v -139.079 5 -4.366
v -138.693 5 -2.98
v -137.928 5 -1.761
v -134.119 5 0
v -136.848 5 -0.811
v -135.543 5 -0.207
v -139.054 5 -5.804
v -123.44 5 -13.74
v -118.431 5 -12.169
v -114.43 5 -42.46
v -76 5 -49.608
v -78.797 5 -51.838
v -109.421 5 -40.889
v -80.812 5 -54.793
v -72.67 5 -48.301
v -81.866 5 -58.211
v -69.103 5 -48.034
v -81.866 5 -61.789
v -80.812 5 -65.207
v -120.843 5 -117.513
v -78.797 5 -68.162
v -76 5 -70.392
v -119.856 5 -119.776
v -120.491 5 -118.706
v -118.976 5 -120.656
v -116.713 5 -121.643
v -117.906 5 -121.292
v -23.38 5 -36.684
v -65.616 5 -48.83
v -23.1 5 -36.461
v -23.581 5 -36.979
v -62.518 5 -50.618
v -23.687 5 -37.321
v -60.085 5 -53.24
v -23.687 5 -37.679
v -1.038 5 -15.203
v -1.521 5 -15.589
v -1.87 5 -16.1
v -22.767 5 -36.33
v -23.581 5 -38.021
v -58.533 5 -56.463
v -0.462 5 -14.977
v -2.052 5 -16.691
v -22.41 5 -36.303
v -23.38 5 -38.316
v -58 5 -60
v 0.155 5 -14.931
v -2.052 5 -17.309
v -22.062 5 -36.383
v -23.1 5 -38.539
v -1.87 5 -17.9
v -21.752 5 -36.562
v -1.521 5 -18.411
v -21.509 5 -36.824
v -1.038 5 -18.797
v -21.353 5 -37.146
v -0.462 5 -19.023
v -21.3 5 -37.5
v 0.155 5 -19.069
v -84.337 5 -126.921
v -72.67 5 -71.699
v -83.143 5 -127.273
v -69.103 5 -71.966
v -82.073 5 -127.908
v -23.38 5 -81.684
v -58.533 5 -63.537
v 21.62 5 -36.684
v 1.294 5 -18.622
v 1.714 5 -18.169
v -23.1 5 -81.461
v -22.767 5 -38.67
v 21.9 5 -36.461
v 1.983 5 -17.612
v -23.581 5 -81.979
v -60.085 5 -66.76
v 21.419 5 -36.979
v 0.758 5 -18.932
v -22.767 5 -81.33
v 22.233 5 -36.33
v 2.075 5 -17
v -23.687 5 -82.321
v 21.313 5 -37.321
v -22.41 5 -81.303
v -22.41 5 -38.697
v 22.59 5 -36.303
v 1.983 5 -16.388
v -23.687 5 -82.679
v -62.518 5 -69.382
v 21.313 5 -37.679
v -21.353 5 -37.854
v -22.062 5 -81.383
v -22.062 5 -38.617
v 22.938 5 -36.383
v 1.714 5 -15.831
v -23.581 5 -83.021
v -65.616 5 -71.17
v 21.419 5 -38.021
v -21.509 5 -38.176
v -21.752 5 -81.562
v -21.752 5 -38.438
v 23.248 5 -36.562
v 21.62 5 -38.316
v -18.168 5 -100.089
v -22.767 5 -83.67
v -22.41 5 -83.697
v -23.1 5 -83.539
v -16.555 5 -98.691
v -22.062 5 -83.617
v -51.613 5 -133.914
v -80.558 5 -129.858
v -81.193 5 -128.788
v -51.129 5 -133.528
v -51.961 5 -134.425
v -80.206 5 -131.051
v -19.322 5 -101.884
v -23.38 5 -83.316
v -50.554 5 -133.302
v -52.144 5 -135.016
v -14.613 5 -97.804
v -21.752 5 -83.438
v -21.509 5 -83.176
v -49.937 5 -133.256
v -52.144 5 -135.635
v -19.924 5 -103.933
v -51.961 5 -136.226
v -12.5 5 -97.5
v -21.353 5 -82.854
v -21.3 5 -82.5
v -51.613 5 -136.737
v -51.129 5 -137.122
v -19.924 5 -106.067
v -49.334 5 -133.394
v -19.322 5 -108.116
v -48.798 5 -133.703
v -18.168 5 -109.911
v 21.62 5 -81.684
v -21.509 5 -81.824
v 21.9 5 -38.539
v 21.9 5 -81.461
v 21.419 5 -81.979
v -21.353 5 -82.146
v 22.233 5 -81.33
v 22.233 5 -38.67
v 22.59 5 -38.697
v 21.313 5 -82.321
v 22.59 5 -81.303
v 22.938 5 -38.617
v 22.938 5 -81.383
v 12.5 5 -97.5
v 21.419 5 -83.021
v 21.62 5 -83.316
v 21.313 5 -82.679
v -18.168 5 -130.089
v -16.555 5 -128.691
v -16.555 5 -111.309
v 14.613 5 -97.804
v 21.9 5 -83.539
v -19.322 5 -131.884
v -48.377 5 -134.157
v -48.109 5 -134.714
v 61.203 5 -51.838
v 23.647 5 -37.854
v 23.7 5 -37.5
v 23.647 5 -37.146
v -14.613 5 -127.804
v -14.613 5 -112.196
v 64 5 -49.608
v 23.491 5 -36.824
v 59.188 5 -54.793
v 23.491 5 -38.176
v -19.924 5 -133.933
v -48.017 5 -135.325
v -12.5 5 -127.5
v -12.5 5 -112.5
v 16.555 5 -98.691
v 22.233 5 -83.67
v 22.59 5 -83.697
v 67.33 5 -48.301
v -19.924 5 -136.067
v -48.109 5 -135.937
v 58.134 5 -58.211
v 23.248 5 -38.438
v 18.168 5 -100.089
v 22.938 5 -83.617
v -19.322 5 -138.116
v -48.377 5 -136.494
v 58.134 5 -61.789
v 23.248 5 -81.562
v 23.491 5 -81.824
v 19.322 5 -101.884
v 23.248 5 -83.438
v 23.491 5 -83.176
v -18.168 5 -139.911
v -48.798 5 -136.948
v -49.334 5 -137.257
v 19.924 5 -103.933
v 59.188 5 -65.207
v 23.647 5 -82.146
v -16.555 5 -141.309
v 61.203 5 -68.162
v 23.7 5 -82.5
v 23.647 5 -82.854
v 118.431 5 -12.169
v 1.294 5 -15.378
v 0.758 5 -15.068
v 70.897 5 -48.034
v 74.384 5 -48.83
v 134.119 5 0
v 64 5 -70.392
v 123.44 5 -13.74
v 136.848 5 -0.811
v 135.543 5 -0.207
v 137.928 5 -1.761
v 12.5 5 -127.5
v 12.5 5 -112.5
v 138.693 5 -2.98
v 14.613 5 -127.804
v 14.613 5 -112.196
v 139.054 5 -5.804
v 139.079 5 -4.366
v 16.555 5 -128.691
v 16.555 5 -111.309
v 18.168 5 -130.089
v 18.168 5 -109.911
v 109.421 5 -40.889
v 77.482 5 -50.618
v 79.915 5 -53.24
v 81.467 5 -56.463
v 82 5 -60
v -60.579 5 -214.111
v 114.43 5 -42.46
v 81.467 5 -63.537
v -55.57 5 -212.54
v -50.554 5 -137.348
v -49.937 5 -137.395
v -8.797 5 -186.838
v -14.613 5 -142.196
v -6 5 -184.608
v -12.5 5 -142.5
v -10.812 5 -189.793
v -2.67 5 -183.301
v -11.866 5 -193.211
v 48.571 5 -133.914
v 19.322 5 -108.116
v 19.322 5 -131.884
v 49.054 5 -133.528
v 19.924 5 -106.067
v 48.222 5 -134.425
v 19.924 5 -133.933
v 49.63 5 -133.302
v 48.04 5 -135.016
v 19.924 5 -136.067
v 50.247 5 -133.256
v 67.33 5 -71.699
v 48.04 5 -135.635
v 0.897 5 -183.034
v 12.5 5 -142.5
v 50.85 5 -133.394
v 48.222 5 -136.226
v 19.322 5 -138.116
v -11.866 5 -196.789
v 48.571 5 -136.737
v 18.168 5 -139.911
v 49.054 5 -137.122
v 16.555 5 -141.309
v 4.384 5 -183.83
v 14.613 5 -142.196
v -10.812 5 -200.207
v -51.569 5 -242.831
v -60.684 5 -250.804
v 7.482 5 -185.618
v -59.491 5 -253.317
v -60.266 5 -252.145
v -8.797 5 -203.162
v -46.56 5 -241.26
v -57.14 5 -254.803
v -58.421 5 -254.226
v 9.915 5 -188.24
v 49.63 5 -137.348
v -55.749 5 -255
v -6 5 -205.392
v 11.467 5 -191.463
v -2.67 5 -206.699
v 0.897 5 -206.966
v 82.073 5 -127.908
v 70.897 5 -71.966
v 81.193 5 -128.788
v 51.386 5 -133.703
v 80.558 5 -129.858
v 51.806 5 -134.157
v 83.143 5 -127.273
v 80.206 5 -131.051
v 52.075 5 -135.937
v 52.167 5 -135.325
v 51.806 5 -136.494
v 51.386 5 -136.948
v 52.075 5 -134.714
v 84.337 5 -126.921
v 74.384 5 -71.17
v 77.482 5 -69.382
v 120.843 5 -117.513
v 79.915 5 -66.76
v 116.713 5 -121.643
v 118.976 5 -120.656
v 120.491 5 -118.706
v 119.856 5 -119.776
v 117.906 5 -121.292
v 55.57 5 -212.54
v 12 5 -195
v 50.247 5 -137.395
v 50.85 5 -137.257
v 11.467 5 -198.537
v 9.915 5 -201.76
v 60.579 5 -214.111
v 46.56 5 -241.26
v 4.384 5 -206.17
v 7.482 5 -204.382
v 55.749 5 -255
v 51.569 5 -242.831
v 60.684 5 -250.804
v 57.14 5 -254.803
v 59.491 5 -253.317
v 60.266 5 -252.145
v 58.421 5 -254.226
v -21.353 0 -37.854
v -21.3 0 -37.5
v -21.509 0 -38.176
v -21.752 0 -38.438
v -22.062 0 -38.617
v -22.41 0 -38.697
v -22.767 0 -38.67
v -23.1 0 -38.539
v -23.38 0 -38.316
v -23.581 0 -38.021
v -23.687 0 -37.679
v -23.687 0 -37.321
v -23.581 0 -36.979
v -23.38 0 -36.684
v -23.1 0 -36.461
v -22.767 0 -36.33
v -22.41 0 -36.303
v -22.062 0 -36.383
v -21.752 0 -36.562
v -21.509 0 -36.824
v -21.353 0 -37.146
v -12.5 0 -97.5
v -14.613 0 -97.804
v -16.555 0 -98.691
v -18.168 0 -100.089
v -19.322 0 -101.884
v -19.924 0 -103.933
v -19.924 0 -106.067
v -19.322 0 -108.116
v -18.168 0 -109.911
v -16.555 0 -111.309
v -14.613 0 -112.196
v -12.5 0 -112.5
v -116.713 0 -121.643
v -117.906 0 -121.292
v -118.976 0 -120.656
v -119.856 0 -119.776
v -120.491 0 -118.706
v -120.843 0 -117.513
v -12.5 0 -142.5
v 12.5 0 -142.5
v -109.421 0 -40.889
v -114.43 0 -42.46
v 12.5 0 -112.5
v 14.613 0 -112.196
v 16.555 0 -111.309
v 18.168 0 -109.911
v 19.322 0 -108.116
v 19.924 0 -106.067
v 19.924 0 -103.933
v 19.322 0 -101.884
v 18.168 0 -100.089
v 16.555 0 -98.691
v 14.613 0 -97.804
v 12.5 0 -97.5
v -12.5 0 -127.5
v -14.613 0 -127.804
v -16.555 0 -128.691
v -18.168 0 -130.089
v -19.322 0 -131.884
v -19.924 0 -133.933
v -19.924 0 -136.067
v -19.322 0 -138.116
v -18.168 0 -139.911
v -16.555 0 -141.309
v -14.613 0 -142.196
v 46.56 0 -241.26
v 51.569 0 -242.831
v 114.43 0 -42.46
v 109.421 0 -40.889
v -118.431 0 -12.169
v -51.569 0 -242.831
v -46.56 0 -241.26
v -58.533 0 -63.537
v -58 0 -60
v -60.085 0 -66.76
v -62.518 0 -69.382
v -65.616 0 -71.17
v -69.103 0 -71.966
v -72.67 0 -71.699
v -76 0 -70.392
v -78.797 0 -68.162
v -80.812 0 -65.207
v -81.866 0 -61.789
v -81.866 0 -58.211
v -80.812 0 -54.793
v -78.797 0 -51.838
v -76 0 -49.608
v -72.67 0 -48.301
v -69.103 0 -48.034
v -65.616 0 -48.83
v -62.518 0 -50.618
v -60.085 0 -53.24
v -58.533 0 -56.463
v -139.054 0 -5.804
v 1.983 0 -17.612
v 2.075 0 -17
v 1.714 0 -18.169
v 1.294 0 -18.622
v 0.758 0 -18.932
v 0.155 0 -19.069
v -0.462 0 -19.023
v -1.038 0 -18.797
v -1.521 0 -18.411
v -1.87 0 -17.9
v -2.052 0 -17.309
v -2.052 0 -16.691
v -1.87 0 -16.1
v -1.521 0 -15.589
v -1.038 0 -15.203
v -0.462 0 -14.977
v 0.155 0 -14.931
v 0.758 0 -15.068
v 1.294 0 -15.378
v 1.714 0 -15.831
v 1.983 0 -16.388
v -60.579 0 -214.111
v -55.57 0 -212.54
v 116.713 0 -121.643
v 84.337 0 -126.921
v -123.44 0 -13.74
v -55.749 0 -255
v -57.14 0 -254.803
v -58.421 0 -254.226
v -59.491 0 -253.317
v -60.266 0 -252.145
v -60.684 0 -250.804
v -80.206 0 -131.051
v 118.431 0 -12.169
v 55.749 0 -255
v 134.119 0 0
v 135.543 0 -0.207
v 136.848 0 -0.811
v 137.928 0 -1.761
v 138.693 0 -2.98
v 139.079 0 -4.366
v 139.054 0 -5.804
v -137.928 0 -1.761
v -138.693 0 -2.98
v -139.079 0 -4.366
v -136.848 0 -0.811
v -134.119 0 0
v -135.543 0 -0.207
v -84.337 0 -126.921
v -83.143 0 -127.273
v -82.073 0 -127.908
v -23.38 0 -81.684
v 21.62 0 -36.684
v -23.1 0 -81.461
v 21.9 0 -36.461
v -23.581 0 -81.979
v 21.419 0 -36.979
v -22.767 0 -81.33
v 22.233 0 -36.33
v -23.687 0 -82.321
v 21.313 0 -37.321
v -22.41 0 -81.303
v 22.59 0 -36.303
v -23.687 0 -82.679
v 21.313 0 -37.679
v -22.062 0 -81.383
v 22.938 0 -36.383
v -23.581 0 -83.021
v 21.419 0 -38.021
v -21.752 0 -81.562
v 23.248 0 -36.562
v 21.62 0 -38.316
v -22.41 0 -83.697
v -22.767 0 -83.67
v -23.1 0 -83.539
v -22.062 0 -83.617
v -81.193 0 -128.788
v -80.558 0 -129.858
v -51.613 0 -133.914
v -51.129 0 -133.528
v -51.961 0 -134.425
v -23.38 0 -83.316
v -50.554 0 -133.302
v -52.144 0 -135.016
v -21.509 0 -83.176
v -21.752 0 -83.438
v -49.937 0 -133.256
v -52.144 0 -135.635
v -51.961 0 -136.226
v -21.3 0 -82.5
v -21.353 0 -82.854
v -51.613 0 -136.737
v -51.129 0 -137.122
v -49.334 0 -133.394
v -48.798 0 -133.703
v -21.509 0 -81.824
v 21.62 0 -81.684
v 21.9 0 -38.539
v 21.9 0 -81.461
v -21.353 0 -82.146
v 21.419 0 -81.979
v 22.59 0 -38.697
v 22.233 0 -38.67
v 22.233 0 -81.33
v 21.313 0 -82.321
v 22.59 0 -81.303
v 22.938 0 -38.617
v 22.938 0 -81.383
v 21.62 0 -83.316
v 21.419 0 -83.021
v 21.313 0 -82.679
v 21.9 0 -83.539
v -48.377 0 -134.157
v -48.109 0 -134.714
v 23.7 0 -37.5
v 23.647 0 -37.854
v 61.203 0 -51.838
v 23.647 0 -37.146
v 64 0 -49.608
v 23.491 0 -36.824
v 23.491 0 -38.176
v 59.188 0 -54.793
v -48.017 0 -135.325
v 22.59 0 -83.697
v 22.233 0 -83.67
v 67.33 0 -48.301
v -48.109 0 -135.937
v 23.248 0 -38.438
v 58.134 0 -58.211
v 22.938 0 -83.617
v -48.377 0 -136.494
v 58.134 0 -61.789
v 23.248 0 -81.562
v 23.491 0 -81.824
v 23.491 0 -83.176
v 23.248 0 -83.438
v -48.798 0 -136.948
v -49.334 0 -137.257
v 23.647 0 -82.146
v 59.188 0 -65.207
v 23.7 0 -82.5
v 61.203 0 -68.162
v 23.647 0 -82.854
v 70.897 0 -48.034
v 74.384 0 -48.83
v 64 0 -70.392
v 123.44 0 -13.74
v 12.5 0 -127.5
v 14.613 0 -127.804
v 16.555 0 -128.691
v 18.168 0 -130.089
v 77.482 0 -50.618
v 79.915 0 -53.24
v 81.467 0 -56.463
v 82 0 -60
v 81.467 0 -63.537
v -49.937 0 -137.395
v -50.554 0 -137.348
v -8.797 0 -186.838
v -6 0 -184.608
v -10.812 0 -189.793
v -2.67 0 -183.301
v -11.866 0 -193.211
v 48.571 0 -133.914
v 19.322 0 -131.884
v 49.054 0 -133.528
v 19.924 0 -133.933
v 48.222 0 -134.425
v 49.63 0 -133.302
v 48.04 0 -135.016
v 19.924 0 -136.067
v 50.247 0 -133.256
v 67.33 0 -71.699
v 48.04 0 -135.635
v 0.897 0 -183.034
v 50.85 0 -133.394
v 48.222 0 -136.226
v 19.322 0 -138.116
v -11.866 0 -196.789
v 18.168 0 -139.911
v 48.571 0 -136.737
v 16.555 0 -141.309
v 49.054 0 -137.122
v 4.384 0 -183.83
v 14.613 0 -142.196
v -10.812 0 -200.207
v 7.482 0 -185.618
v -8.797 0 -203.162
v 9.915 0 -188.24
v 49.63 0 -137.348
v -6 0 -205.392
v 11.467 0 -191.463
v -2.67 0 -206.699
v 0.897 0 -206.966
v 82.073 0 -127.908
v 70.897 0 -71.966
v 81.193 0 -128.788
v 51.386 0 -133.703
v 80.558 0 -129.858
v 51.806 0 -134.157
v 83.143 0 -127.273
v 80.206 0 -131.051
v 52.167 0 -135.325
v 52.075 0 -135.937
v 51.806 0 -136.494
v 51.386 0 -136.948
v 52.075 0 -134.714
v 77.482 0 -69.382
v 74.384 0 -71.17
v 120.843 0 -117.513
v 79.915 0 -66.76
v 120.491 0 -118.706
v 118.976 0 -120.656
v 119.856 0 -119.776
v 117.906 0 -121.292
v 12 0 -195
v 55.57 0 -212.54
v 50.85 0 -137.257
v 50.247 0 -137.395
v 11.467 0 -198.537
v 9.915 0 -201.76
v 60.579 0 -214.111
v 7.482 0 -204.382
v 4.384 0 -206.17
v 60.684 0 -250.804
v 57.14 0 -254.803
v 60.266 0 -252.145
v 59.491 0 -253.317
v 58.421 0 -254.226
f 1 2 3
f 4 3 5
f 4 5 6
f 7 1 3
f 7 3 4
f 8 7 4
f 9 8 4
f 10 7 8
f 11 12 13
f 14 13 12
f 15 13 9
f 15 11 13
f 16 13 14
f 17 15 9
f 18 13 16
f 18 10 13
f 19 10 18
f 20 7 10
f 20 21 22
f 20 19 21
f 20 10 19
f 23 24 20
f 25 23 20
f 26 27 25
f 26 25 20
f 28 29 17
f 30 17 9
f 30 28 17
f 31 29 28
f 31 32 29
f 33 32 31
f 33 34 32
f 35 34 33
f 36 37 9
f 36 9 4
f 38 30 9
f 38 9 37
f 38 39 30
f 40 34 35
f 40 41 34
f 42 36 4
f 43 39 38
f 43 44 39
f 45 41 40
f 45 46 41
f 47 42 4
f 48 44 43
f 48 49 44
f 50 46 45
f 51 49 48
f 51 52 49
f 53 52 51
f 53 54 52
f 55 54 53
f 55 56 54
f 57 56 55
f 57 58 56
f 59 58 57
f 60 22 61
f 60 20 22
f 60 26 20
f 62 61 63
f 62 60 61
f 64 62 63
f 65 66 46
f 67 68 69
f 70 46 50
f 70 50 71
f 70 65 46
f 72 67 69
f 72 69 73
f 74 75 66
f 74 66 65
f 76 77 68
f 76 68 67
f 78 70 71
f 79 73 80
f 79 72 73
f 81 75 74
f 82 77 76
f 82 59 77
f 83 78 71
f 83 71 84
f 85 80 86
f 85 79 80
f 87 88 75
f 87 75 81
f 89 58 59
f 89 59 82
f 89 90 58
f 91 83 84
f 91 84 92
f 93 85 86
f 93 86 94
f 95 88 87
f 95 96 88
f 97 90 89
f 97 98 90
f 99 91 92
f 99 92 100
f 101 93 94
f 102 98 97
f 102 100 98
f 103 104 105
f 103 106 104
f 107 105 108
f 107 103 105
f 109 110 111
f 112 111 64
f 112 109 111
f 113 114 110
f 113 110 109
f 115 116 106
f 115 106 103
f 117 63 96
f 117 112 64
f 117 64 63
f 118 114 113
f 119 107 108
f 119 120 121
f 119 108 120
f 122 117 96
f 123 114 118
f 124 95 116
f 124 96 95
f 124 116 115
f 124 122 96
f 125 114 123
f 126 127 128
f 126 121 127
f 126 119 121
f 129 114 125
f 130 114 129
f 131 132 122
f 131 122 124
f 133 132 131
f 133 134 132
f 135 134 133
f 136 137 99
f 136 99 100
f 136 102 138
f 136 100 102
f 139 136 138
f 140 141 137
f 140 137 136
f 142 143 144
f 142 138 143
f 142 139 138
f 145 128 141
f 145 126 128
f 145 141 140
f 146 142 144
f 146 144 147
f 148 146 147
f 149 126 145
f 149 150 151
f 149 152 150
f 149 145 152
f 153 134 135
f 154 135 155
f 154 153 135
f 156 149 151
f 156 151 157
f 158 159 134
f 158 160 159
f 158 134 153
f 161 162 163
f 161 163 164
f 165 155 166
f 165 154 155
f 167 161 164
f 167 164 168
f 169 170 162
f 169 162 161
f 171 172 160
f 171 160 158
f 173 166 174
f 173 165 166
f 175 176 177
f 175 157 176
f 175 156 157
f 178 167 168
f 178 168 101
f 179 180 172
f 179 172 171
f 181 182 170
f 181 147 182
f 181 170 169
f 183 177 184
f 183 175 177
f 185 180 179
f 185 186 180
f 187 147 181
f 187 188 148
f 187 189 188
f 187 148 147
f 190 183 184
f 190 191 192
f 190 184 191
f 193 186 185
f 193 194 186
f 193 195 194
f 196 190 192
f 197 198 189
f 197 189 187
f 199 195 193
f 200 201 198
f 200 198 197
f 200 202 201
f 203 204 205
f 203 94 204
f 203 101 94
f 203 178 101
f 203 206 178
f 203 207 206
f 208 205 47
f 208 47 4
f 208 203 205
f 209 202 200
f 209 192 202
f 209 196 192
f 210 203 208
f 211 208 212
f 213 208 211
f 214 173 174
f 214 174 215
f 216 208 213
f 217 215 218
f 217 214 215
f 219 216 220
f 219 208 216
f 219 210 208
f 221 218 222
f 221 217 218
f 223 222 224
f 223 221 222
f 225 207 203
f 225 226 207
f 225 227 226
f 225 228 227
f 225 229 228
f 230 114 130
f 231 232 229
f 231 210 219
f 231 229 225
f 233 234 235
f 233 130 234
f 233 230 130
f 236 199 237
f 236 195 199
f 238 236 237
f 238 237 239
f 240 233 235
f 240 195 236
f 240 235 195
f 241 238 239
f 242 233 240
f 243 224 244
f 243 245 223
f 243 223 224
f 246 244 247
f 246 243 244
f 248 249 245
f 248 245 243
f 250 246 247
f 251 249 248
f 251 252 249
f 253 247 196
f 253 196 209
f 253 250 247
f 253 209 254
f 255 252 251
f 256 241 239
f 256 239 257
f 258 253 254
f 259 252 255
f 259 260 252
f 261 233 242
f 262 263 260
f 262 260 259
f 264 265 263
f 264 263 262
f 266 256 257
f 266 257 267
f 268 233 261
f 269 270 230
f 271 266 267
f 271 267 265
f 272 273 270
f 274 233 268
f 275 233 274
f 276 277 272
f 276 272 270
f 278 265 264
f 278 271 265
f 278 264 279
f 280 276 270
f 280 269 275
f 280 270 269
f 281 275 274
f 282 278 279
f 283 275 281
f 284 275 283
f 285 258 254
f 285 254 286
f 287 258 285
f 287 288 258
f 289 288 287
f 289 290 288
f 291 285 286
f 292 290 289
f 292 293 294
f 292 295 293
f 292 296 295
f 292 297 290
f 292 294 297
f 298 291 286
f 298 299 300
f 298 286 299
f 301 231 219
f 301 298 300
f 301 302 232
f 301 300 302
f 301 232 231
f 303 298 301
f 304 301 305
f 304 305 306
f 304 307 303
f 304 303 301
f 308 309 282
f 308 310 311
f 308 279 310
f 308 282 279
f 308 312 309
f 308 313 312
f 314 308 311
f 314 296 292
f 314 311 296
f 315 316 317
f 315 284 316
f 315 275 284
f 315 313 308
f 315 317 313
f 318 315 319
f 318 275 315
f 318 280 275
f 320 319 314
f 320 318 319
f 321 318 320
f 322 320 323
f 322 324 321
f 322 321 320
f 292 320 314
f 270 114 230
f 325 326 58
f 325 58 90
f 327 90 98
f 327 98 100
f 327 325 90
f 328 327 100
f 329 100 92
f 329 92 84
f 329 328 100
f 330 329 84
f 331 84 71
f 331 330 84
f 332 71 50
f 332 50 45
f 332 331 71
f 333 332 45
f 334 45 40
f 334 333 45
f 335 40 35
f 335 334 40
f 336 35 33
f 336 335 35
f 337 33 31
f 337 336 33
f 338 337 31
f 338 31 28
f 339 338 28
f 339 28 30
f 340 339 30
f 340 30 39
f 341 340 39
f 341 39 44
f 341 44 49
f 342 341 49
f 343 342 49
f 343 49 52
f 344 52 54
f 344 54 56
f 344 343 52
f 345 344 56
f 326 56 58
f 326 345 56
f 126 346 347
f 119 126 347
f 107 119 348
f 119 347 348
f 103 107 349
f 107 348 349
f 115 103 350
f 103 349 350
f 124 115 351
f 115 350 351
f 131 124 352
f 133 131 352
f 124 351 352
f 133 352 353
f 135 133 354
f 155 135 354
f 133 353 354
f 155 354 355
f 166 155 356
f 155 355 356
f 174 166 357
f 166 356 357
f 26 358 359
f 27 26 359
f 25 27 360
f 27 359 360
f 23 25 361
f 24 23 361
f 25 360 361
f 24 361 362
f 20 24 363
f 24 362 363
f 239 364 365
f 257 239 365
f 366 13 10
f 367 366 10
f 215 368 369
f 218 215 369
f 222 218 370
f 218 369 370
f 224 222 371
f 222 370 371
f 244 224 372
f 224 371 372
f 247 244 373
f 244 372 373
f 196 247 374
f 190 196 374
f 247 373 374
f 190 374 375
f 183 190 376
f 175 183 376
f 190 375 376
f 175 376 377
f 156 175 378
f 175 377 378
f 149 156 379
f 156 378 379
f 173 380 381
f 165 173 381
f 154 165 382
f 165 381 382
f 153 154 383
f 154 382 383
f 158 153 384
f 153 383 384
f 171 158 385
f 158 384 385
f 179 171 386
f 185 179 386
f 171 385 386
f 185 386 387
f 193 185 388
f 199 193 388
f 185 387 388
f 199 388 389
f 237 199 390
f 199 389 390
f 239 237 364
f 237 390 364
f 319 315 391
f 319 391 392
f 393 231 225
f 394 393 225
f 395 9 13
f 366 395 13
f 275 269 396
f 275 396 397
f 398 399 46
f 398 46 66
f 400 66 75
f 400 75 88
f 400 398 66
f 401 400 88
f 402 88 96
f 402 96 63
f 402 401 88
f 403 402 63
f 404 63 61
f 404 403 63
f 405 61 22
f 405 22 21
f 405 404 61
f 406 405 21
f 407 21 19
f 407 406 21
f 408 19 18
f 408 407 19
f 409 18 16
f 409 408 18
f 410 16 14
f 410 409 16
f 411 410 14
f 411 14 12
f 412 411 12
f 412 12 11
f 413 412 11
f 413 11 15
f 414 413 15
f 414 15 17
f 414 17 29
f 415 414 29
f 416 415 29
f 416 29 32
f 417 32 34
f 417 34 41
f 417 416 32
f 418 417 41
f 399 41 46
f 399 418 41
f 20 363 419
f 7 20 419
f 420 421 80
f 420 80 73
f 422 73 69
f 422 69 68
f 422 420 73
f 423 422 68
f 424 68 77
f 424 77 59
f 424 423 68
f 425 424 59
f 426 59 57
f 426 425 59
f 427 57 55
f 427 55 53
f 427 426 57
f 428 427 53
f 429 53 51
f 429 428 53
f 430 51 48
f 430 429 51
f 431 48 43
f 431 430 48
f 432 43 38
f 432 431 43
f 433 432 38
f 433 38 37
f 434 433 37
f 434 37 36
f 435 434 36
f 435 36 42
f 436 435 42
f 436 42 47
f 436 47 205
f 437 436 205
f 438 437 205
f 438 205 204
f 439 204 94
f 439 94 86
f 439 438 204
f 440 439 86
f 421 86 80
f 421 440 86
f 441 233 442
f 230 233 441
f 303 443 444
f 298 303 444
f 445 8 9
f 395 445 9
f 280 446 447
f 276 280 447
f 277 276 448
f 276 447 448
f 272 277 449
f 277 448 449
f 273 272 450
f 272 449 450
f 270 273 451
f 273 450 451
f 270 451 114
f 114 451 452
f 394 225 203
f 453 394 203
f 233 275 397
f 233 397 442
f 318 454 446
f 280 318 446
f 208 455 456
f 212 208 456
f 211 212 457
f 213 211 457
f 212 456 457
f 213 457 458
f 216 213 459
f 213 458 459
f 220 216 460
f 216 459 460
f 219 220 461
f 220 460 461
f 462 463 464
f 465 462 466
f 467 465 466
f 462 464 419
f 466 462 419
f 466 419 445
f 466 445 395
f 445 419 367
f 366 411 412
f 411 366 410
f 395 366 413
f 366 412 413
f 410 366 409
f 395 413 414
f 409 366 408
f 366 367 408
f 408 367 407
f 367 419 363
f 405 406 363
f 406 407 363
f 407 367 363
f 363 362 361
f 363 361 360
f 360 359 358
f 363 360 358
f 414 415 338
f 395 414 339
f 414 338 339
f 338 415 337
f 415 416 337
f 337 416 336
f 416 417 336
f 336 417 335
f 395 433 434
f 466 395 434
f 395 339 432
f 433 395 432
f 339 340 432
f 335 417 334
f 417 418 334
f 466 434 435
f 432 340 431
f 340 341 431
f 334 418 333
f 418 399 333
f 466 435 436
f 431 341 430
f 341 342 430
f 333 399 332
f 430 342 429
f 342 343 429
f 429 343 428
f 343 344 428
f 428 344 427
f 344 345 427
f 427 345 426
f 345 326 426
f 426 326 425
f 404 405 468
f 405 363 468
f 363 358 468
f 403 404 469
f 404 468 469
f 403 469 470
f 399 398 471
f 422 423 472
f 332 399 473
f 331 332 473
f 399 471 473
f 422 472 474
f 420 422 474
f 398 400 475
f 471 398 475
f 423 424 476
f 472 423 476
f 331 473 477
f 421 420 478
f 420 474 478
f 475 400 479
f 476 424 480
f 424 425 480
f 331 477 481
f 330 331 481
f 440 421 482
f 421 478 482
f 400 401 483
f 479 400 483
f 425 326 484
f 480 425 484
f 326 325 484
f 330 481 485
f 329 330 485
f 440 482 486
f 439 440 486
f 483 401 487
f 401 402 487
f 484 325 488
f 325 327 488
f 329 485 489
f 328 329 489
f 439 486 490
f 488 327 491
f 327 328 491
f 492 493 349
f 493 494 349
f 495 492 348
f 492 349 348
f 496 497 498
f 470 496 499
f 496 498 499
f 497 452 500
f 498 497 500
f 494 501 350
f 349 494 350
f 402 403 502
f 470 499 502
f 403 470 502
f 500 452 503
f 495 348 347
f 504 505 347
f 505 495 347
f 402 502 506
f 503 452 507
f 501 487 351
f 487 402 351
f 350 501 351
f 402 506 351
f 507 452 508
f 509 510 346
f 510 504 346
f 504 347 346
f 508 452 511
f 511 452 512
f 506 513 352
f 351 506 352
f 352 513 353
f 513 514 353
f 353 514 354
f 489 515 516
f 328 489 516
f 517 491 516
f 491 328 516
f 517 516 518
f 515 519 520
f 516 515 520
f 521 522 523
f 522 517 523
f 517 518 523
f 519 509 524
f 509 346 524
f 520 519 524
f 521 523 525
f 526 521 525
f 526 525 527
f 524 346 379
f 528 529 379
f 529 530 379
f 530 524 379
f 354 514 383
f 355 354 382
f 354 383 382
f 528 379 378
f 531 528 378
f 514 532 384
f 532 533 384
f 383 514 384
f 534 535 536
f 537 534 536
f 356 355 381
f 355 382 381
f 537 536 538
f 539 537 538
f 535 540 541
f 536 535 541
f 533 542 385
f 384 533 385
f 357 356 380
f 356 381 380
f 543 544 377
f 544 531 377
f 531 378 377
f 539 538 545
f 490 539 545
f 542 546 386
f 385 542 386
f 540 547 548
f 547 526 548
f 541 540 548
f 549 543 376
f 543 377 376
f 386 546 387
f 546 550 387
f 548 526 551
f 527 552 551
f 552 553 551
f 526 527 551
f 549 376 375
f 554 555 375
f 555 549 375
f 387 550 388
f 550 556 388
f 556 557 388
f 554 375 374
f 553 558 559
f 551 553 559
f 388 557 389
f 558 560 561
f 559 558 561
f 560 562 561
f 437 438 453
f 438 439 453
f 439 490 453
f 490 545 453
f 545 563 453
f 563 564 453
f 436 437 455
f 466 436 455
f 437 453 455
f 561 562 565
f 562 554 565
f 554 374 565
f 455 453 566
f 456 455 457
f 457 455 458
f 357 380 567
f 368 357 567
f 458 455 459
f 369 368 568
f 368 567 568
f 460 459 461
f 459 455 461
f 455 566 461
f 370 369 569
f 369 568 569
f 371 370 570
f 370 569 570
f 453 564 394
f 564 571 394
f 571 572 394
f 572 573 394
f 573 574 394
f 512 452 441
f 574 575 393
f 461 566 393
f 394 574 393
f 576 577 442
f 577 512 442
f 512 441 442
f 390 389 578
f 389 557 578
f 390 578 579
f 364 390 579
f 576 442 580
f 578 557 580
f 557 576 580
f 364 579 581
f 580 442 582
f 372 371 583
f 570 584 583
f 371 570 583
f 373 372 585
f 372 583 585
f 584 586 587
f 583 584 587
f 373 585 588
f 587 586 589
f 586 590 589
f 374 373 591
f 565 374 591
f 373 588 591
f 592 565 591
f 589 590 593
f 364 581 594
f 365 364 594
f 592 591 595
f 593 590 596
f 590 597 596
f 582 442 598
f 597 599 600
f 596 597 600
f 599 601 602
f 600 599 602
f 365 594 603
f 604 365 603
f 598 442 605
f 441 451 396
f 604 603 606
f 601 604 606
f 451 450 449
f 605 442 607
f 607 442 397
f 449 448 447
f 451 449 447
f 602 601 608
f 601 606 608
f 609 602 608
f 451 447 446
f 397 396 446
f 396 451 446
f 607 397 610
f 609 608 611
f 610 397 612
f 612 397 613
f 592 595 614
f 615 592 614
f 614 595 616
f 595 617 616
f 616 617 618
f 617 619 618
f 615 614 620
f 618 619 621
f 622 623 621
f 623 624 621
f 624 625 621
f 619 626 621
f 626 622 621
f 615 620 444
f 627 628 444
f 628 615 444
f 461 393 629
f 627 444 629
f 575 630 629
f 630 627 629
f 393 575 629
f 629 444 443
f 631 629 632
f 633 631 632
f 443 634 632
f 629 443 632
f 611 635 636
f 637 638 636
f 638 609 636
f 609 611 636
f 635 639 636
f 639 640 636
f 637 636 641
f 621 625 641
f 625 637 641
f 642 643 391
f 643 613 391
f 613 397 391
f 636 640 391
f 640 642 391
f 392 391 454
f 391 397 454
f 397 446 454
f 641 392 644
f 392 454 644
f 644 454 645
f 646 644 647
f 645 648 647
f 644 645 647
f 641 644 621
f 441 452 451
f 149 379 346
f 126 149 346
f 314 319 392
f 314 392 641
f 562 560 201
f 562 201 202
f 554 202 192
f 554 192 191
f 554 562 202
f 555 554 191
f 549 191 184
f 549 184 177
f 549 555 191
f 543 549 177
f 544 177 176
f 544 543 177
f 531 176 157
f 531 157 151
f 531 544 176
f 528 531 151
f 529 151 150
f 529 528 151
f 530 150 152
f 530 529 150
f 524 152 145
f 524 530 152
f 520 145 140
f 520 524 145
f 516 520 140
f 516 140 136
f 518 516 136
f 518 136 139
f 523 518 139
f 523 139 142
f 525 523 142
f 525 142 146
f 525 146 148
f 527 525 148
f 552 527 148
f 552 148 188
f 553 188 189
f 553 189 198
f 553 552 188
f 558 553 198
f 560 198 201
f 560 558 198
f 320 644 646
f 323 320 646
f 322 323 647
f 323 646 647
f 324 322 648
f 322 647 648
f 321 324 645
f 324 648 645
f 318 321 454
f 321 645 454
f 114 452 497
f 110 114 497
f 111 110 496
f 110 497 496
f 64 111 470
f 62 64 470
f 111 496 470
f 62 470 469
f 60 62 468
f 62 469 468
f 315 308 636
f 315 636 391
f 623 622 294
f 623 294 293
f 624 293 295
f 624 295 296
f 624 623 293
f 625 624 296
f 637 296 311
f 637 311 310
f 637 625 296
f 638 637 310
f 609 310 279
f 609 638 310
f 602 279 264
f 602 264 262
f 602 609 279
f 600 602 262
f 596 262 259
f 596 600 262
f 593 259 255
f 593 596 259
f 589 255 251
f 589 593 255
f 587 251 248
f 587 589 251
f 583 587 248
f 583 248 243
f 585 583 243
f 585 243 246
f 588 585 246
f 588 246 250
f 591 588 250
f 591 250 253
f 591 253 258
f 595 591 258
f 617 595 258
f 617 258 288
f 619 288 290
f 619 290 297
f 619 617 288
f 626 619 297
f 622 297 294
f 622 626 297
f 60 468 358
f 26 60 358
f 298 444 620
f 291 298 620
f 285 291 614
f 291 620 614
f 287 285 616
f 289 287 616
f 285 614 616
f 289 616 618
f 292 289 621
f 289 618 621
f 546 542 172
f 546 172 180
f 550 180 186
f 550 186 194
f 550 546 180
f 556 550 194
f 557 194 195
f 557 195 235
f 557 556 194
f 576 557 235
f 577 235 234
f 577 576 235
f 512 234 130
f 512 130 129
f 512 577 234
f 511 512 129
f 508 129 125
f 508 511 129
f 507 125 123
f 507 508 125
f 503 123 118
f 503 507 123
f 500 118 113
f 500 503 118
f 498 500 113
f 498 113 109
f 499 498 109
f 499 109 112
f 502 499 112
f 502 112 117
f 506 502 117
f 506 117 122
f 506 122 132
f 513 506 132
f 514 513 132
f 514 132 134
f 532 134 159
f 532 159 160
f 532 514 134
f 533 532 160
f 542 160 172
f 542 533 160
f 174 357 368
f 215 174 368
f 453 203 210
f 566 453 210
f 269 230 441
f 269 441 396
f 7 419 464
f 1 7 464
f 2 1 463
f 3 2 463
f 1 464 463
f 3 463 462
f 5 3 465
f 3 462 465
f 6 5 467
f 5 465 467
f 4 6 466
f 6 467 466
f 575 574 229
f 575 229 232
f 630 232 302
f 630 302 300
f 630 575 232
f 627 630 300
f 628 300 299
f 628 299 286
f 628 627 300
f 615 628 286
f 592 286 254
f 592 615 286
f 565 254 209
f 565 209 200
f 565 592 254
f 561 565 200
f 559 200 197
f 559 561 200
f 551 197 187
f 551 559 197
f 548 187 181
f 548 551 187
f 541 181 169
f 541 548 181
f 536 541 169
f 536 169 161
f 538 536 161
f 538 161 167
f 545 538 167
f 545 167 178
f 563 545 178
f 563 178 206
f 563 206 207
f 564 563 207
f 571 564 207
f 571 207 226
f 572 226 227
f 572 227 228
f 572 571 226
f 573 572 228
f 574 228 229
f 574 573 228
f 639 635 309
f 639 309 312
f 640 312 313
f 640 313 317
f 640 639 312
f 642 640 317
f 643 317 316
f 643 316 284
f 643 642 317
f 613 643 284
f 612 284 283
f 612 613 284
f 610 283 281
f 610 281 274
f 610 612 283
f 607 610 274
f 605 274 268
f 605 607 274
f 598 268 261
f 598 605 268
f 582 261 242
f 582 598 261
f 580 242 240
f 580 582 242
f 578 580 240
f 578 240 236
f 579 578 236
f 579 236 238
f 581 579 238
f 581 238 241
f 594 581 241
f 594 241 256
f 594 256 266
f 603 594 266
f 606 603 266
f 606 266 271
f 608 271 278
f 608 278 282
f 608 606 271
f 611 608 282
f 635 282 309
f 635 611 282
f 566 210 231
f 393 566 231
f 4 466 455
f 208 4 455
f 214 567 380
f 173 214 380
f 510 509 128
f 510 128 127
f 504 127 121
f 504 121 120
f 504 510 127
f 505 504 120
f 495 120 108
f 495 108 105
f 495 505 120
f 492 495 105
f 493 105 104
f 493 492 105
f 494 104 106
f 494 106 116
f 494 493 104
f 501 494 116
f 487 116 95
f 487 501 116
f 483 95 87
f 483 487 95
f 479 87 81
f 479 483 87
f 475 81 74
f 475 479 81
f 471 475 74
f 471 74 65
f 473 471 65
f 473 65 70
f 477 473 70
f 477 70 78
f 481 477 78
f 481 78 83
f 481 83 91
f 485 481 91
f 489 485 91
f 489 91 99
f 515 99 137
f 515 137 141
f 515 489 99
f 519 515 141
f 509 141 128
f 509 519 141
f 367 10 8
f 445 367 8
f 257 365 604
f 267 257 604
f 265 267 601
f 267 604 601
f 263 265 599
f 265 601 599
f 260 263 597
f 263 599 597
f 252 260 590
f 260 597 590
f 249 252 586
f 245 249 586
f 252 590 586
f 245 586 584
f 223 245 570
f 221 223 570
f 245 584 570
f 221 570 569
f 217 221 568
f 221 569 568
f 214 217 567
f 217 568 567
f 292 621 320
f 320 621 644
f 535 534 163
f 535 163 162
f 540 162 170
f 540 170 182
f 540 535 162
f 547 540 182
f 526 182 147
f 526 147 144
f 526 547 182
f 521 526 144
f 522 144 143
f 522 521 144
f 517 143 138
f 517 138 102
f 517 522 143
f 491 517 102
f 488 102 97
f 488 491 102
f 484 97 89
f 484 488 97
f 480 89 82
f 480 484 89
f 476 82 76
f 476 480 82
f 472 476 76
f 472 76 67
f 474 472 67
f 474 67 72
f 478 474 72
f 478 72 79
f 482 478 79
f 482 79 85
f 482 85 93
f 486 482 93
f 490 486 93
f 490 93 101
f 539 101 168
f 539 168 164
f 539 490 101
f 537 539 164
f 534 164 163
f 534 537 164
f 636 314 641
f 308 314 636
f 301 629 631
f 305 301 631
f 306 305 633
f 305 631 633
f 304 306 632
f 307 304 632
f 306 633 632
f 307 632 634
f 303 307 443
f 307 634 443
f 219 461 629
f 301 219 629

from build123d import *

# Parameters (mm, degrees)
SKETCH1_R           = 12
SKETCH1_R_2         = 1.2
SKETCH1_R_3         = 2.075
BOSS_EXTRUDE1_DEPTH = 5
CUT_EXTRUDE1_DEPTH  = 5


with BuildPart() as part:
    # Sketch1 → Boss-Extrude1 (new body)
    with BuildSketch(Plane(origin=(0, 0, 0), x_dir=(1, 0, 0), z_dir=(0, 1, 0))):
        with BuildLine():
            Line((-134.118891506, 0), (134.118891506, 0))
            ThreePointArc((134.118891506, 0), (137.928249972, 1.76136015), (139.053747558, 5.804484769))
            Line((139.053747558, 5.804484769), (120.84297072, 117.512705691))
            ThreePointArc((120.84297072, 117.512705691), (119.443648574, 120.243754828), (116.712599437, 121.643076974))
            Line((116.712599437, 121.643076974), (84.336583334, 126.921044874))
            ThreePointArc((84.336583334, 126.921044874), (81.605534197, 128.32036702), (80.206212051, 131.051416157))
            Line((80.206212051, 131.051416157), (60.683956749, 250.804484769))
            ThreePointArc((60.683956749, 250.804484769), (58.987740546, 253.809358466), (55.749100697, 255))
            Line((55.749100697, 255), (-55.749100697, 255))
            ThreePointArc((-55.749100697, 255), (-58.987740546, 253.809358466), (-60.683956749, 250.804484769))
            Line((-60.683956749, 250.804484769), (-80.206212051, 131.051416157))
            ThreePointArc((-80.206212051, 131.051416157), (-81.605534197, 128.32036702), (-84.336583334, 126.921044874))
            Line((-84.336583334, 126.921044874), (-116.712599437, 121.643076974))
            ThreePointArc((-116.712599437, 121.643076974), (-119.443648574, 120.243754828), (-120.84297072, 117.512705691))
            Line((-120.84297072, 117.512705691), (-139.053747558, 5.804484769))
            ThreePointArc((-139.053747558, 5.804484769), (-137.928249972, 1.76136015), (-134.118891506, 0))
        make_face()
        with Locations((0, 195)):
            Circle(SKETCH1_R, mode=Mode.SUBTRACT)
        with Locations((-70, 60)):
            Circle(SKETCH1_R, mode=Mode.SUBTRACT)
        with Locations((70, 60)):
            Circle(SKETCH1_R, mode=Mode.SUBTRACT)
        with Locations((-22.5, 82.5)):
            Circle(SKETCH1_R_2, mode=Mode.SUBTRACT)
        with Locations((22.5, 82.5)):
            Circle(SKETCH1_R_2, mode=Mode.SUBTRACT)
        with Locations((22.5, 37.5)):
            Circle(SKETCH1_R_2, mode=Mode.SUBTRACT)
        with Locations((-22.5, 37.5)):
            Circle(SKETCH1_R_2, mode=Mode.SUBTRACT)
        with Locations((-50.091827035, 135.325391796)):
            Circle(SKETCH1_R_3, mode=Mode.SUBTRACT)
        with Locations((50.091827035, 135.325391796)):
            Circle(SKETCH1_R_3, mode=Mode.SUBTRACT)
        with Locations((0, 17)):
            Circle(SKETCH1_R_3, mode=Mode.SUBTRACT)
        with BuildLine():
            Line((12.5, 127.5), (-12.5, 127.5))
            ThreePointArc((-12.5, 127.5), (-20, 135), (-12.5, 142.5))
            Line((-12.5, 142.5), (12.5, 142.5))
            ThreePointArc((12.5, 142.5), (20, 135), (12.5, 127.5))
        make_face(mode=Mode.SUBTRACT)
        with BuildLine():
            Line((12.5, 97.5), (-12.5, 97.5))
            ThreePointArc((-12.5, 97.5), (-20, 105), (-12.5, 112.5))
            Line((-12.5, 112.5), (12.5, 112.5))
            ThreePointArc((12.5, 112.5), (20, 105), (12.5, 97.5))
        make_face(mode=Mode.SUBTRACT)
    extrude(amount=BOSS_EXTRUDE1_DEPTH)

    # Sketch2 → Cut-Extrude1 (cut)
    with BuildSketch(Plane(origin=(0, 5, 0), x_dir=(1, 0, 0), z_dir=(0, 1, 0))):
        Polygon((-60.578994825, 214.111244254), (-51.568858582, 242.831053531), (-46.559589522, 241.259518139), (-55.569725765, 212.539708863), align=None)
        Polygon((-118.431141418, 12.168946469), (-109.421005175, 40.888755746), (-114.430274235, 42.460291137), (-123.440410478, 13.740481861), align=None)
        Polygon((123.440410478, 13.740481861), (114.430274235, 42.460291137), (109.421005175, 40.888755746), (118.431141418, 12.168946469), align=None)
        Polygon((55.569725765, 212.539708863), (46.559589522, 241.259518139), (51.568858582, 242.831053531), (60.578994825, 214.111244254), align=None)
    extrude(amount=-CUT_EXTRUDE1_DEPTH, mode=Mode.SUBTRACT)


solid = part.part
